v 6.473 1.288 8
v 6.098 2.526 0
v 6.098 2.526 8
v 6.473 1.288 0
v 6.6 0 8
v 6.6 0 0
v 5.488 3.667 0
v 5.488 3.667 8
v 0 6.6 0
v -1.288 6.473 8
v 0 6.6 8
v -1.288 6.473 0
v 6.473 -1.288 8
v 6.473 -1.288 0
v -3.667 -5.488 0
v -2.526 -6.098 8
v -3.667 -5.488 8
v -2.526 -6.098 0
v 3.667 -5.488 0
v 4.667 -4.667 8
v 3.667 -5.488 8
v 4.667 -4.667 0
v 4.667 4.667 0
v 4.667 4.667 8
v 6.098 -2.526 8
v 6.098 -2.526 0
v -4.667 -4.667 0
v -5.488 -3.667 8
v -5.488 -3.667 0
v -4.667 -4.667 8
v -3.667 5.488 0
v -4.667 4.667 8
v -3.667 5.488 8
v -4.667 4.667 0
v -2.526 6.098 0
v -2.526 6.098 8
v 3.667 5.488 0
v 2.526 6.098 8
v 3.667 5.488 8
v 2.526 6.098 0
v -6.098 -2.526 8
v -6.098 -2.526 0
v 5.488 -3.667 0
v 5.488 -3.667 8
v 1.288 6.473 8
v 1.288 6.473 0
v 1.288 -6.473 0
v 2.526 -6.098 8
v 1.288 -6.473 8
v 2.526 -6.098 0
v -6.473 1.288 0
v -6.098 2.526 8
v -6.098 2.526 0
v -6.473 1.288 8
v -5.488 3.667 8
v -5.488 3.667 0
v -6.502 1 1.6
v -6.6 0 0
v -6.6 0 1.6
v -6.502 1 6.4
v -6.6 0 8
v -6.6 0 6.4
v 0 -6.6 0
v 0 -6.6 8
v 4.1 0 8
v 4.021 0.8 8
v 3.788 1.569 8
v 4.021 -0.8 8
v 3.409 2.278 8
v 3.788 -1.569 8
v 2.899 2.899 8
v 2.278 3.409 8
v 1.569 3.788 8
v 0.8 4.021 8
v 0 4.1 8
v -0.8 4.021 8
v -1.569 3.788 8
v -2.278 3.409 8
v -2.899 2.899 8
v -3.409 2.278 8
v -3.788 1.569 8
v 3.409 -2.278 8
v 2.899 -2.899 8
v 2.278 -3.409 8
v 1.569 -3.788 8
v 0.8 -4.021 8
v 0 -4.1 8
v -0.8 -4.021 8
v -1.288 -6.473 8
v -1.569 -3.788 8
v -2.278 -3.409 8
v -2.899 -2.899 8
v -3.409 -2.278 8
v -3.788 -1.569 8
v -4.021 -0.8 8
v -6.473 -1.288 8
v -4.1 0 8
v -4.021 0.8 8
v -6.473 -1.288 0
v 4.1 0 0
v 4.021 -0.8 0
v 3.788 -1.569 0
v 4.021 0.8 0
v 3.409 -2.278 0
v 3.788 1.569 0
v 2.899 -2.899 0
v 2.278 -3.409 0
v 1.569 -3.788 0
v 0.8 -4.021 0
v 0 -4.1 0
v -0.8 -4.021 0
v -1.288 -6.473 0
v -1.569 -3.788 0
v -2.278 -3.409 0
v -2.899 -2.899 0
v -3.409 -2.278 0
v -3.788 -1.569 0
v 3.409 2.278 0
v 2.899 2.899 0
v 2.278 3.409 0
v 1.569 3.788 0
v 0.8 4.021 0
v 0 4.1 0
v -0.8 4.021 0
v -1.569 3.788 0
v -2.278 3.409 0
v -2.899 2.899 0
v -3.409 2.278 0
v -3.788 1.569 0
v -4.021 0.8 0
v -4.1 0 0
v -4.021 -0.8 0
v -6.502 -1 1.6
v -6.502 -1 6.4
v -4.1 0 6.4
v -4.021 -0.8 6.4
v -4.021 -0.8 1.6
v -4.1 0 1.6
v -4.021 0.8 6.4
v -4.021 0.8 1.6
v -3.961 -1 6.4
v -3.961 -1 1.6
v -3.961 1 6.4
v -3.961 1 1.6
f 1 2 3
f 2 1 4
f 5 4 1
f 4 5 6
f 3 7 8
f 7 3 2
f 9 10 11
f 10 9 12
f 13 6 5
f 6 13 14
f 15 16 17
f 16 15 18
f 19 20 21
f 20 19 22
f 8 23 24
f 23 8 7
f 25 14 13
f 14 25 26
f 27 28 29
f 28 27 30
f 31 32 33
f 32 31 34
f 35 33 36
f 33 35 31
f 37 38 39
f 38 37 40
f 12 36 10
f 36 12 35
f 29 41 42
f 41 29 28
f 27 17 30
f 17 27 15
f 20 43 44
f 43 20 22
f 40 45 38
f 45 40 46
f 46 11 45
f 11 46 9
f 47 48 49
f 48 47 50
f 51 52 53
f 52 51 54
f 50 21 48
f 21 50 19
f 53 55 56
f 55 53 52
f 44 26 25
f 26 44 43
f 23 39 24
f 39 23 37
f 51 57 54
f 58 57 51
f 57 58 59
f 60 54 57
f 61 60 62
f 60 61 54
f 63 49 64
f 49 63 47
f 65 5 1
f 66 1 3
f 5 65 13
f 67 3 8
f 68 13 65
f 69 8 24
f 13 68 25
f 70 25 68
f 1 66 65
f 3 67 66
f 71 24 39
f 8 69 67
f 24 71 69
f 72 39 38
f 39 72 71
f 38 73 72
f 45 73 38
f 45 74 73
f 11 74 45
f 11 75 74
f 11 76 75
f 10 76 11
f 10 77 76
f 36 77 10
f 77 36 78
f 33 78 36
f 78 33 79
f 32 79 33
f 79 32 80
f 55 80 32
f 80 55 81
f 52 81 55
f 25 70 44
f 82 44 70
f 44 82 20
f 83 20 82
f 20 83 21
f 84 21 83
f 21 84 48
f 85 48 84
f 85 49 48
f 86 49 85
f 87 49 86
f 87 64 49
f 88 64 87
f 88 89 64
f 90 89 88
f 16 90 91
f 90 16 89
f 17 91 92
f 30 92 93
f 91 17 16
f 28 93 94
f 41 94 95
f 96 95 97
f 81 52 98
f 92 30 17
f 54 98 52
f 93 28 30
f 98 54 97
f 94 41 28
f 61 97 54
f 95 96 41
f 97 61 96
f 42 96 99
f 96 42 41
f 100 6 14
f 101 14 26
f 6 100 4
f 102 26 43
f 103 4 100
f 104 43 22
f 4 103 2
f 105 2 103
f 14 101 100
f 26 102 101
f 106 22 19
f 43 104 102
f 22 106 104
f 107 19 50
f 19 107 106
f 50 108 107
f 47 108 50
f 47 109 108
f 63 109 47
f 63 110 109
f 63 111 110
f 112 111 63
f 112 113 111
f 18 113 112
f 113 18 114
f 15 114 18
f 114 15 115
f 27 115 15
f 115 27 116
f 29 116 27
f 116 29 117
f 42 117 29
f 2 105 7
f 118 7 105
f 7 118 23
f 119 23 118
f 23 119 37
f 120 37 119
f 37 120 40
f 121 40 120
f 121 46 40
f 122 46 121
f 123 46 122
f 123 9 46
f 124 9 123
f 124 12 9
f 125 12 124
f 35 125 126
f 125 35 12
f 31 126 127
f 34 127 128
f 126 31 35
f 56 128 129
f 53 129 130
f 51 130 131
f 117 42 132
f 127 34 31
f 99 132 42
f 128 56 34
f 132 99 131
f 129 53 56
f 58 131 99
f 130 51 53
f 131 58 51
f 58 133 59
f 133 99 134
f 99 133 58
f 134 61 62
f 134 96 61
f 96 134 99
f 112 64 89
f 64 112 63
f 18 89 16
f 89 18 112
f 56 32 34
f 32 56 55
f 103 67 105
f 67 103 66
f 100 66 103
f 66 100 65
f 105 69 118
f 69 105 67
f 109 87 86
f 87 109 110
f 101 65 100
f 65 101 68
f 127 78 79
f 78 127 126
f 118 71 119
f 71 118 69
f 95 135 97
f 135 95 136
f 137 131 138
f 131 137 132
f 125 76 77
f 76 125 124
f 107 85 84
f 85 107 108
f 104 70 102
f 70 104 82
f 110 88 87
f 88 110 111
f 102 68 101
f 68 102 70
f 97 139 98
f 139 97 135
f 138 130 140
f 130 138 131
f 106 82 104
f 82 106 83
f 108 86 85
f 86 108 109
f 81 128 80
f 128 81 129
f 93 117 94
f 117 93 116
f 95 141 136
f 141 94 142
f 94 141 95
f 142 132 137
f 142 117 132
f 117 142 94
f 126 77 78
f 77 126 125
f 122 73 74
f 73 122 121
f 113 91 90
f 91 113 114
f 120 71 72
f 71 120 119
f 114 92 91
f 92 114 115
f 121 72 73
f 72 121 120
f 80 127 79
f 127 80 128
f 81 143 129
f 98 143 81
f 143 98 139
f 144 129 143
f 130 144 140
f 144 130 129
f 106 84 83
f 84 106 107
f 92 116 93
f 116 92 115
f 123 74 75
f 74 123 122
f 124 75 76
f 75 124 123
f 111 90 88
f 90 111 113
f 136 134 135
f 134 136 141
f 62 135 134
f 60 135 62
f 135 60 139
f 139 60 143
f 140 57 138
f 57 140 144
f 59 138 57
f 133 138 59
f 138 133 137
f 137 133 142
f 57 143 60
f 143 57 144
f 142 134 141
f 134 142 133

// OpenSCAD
$fn = 32;

// ----------------------------------------------------------------------
// Spacer sleeve: 13.2 / 8.2 x 8 mm
// ----------------------------------------------------------------------

// --- parameters (mm) ---
outer_d = 13.2;           // outside diameter
inner_d = 8.2;            // shaft bore
length = 8;               // sleeve length
slot_w = 2;               // clamp slot width
slot_len = 4.8;           // clamp slot length

module sleeve() {
  cylinder(h = length, d = outer_d);
}

difference() {
  sleeve();
  translate([0, 0, -1]) cylinder(h = length + 2, d = inner_d);
  translate([-outer_d / 2 - 1, -slot_w / 2, length / 2 - slot_len / 2]) cube([outer_d / 2 + 1, slot_w, slot_len]);
}
